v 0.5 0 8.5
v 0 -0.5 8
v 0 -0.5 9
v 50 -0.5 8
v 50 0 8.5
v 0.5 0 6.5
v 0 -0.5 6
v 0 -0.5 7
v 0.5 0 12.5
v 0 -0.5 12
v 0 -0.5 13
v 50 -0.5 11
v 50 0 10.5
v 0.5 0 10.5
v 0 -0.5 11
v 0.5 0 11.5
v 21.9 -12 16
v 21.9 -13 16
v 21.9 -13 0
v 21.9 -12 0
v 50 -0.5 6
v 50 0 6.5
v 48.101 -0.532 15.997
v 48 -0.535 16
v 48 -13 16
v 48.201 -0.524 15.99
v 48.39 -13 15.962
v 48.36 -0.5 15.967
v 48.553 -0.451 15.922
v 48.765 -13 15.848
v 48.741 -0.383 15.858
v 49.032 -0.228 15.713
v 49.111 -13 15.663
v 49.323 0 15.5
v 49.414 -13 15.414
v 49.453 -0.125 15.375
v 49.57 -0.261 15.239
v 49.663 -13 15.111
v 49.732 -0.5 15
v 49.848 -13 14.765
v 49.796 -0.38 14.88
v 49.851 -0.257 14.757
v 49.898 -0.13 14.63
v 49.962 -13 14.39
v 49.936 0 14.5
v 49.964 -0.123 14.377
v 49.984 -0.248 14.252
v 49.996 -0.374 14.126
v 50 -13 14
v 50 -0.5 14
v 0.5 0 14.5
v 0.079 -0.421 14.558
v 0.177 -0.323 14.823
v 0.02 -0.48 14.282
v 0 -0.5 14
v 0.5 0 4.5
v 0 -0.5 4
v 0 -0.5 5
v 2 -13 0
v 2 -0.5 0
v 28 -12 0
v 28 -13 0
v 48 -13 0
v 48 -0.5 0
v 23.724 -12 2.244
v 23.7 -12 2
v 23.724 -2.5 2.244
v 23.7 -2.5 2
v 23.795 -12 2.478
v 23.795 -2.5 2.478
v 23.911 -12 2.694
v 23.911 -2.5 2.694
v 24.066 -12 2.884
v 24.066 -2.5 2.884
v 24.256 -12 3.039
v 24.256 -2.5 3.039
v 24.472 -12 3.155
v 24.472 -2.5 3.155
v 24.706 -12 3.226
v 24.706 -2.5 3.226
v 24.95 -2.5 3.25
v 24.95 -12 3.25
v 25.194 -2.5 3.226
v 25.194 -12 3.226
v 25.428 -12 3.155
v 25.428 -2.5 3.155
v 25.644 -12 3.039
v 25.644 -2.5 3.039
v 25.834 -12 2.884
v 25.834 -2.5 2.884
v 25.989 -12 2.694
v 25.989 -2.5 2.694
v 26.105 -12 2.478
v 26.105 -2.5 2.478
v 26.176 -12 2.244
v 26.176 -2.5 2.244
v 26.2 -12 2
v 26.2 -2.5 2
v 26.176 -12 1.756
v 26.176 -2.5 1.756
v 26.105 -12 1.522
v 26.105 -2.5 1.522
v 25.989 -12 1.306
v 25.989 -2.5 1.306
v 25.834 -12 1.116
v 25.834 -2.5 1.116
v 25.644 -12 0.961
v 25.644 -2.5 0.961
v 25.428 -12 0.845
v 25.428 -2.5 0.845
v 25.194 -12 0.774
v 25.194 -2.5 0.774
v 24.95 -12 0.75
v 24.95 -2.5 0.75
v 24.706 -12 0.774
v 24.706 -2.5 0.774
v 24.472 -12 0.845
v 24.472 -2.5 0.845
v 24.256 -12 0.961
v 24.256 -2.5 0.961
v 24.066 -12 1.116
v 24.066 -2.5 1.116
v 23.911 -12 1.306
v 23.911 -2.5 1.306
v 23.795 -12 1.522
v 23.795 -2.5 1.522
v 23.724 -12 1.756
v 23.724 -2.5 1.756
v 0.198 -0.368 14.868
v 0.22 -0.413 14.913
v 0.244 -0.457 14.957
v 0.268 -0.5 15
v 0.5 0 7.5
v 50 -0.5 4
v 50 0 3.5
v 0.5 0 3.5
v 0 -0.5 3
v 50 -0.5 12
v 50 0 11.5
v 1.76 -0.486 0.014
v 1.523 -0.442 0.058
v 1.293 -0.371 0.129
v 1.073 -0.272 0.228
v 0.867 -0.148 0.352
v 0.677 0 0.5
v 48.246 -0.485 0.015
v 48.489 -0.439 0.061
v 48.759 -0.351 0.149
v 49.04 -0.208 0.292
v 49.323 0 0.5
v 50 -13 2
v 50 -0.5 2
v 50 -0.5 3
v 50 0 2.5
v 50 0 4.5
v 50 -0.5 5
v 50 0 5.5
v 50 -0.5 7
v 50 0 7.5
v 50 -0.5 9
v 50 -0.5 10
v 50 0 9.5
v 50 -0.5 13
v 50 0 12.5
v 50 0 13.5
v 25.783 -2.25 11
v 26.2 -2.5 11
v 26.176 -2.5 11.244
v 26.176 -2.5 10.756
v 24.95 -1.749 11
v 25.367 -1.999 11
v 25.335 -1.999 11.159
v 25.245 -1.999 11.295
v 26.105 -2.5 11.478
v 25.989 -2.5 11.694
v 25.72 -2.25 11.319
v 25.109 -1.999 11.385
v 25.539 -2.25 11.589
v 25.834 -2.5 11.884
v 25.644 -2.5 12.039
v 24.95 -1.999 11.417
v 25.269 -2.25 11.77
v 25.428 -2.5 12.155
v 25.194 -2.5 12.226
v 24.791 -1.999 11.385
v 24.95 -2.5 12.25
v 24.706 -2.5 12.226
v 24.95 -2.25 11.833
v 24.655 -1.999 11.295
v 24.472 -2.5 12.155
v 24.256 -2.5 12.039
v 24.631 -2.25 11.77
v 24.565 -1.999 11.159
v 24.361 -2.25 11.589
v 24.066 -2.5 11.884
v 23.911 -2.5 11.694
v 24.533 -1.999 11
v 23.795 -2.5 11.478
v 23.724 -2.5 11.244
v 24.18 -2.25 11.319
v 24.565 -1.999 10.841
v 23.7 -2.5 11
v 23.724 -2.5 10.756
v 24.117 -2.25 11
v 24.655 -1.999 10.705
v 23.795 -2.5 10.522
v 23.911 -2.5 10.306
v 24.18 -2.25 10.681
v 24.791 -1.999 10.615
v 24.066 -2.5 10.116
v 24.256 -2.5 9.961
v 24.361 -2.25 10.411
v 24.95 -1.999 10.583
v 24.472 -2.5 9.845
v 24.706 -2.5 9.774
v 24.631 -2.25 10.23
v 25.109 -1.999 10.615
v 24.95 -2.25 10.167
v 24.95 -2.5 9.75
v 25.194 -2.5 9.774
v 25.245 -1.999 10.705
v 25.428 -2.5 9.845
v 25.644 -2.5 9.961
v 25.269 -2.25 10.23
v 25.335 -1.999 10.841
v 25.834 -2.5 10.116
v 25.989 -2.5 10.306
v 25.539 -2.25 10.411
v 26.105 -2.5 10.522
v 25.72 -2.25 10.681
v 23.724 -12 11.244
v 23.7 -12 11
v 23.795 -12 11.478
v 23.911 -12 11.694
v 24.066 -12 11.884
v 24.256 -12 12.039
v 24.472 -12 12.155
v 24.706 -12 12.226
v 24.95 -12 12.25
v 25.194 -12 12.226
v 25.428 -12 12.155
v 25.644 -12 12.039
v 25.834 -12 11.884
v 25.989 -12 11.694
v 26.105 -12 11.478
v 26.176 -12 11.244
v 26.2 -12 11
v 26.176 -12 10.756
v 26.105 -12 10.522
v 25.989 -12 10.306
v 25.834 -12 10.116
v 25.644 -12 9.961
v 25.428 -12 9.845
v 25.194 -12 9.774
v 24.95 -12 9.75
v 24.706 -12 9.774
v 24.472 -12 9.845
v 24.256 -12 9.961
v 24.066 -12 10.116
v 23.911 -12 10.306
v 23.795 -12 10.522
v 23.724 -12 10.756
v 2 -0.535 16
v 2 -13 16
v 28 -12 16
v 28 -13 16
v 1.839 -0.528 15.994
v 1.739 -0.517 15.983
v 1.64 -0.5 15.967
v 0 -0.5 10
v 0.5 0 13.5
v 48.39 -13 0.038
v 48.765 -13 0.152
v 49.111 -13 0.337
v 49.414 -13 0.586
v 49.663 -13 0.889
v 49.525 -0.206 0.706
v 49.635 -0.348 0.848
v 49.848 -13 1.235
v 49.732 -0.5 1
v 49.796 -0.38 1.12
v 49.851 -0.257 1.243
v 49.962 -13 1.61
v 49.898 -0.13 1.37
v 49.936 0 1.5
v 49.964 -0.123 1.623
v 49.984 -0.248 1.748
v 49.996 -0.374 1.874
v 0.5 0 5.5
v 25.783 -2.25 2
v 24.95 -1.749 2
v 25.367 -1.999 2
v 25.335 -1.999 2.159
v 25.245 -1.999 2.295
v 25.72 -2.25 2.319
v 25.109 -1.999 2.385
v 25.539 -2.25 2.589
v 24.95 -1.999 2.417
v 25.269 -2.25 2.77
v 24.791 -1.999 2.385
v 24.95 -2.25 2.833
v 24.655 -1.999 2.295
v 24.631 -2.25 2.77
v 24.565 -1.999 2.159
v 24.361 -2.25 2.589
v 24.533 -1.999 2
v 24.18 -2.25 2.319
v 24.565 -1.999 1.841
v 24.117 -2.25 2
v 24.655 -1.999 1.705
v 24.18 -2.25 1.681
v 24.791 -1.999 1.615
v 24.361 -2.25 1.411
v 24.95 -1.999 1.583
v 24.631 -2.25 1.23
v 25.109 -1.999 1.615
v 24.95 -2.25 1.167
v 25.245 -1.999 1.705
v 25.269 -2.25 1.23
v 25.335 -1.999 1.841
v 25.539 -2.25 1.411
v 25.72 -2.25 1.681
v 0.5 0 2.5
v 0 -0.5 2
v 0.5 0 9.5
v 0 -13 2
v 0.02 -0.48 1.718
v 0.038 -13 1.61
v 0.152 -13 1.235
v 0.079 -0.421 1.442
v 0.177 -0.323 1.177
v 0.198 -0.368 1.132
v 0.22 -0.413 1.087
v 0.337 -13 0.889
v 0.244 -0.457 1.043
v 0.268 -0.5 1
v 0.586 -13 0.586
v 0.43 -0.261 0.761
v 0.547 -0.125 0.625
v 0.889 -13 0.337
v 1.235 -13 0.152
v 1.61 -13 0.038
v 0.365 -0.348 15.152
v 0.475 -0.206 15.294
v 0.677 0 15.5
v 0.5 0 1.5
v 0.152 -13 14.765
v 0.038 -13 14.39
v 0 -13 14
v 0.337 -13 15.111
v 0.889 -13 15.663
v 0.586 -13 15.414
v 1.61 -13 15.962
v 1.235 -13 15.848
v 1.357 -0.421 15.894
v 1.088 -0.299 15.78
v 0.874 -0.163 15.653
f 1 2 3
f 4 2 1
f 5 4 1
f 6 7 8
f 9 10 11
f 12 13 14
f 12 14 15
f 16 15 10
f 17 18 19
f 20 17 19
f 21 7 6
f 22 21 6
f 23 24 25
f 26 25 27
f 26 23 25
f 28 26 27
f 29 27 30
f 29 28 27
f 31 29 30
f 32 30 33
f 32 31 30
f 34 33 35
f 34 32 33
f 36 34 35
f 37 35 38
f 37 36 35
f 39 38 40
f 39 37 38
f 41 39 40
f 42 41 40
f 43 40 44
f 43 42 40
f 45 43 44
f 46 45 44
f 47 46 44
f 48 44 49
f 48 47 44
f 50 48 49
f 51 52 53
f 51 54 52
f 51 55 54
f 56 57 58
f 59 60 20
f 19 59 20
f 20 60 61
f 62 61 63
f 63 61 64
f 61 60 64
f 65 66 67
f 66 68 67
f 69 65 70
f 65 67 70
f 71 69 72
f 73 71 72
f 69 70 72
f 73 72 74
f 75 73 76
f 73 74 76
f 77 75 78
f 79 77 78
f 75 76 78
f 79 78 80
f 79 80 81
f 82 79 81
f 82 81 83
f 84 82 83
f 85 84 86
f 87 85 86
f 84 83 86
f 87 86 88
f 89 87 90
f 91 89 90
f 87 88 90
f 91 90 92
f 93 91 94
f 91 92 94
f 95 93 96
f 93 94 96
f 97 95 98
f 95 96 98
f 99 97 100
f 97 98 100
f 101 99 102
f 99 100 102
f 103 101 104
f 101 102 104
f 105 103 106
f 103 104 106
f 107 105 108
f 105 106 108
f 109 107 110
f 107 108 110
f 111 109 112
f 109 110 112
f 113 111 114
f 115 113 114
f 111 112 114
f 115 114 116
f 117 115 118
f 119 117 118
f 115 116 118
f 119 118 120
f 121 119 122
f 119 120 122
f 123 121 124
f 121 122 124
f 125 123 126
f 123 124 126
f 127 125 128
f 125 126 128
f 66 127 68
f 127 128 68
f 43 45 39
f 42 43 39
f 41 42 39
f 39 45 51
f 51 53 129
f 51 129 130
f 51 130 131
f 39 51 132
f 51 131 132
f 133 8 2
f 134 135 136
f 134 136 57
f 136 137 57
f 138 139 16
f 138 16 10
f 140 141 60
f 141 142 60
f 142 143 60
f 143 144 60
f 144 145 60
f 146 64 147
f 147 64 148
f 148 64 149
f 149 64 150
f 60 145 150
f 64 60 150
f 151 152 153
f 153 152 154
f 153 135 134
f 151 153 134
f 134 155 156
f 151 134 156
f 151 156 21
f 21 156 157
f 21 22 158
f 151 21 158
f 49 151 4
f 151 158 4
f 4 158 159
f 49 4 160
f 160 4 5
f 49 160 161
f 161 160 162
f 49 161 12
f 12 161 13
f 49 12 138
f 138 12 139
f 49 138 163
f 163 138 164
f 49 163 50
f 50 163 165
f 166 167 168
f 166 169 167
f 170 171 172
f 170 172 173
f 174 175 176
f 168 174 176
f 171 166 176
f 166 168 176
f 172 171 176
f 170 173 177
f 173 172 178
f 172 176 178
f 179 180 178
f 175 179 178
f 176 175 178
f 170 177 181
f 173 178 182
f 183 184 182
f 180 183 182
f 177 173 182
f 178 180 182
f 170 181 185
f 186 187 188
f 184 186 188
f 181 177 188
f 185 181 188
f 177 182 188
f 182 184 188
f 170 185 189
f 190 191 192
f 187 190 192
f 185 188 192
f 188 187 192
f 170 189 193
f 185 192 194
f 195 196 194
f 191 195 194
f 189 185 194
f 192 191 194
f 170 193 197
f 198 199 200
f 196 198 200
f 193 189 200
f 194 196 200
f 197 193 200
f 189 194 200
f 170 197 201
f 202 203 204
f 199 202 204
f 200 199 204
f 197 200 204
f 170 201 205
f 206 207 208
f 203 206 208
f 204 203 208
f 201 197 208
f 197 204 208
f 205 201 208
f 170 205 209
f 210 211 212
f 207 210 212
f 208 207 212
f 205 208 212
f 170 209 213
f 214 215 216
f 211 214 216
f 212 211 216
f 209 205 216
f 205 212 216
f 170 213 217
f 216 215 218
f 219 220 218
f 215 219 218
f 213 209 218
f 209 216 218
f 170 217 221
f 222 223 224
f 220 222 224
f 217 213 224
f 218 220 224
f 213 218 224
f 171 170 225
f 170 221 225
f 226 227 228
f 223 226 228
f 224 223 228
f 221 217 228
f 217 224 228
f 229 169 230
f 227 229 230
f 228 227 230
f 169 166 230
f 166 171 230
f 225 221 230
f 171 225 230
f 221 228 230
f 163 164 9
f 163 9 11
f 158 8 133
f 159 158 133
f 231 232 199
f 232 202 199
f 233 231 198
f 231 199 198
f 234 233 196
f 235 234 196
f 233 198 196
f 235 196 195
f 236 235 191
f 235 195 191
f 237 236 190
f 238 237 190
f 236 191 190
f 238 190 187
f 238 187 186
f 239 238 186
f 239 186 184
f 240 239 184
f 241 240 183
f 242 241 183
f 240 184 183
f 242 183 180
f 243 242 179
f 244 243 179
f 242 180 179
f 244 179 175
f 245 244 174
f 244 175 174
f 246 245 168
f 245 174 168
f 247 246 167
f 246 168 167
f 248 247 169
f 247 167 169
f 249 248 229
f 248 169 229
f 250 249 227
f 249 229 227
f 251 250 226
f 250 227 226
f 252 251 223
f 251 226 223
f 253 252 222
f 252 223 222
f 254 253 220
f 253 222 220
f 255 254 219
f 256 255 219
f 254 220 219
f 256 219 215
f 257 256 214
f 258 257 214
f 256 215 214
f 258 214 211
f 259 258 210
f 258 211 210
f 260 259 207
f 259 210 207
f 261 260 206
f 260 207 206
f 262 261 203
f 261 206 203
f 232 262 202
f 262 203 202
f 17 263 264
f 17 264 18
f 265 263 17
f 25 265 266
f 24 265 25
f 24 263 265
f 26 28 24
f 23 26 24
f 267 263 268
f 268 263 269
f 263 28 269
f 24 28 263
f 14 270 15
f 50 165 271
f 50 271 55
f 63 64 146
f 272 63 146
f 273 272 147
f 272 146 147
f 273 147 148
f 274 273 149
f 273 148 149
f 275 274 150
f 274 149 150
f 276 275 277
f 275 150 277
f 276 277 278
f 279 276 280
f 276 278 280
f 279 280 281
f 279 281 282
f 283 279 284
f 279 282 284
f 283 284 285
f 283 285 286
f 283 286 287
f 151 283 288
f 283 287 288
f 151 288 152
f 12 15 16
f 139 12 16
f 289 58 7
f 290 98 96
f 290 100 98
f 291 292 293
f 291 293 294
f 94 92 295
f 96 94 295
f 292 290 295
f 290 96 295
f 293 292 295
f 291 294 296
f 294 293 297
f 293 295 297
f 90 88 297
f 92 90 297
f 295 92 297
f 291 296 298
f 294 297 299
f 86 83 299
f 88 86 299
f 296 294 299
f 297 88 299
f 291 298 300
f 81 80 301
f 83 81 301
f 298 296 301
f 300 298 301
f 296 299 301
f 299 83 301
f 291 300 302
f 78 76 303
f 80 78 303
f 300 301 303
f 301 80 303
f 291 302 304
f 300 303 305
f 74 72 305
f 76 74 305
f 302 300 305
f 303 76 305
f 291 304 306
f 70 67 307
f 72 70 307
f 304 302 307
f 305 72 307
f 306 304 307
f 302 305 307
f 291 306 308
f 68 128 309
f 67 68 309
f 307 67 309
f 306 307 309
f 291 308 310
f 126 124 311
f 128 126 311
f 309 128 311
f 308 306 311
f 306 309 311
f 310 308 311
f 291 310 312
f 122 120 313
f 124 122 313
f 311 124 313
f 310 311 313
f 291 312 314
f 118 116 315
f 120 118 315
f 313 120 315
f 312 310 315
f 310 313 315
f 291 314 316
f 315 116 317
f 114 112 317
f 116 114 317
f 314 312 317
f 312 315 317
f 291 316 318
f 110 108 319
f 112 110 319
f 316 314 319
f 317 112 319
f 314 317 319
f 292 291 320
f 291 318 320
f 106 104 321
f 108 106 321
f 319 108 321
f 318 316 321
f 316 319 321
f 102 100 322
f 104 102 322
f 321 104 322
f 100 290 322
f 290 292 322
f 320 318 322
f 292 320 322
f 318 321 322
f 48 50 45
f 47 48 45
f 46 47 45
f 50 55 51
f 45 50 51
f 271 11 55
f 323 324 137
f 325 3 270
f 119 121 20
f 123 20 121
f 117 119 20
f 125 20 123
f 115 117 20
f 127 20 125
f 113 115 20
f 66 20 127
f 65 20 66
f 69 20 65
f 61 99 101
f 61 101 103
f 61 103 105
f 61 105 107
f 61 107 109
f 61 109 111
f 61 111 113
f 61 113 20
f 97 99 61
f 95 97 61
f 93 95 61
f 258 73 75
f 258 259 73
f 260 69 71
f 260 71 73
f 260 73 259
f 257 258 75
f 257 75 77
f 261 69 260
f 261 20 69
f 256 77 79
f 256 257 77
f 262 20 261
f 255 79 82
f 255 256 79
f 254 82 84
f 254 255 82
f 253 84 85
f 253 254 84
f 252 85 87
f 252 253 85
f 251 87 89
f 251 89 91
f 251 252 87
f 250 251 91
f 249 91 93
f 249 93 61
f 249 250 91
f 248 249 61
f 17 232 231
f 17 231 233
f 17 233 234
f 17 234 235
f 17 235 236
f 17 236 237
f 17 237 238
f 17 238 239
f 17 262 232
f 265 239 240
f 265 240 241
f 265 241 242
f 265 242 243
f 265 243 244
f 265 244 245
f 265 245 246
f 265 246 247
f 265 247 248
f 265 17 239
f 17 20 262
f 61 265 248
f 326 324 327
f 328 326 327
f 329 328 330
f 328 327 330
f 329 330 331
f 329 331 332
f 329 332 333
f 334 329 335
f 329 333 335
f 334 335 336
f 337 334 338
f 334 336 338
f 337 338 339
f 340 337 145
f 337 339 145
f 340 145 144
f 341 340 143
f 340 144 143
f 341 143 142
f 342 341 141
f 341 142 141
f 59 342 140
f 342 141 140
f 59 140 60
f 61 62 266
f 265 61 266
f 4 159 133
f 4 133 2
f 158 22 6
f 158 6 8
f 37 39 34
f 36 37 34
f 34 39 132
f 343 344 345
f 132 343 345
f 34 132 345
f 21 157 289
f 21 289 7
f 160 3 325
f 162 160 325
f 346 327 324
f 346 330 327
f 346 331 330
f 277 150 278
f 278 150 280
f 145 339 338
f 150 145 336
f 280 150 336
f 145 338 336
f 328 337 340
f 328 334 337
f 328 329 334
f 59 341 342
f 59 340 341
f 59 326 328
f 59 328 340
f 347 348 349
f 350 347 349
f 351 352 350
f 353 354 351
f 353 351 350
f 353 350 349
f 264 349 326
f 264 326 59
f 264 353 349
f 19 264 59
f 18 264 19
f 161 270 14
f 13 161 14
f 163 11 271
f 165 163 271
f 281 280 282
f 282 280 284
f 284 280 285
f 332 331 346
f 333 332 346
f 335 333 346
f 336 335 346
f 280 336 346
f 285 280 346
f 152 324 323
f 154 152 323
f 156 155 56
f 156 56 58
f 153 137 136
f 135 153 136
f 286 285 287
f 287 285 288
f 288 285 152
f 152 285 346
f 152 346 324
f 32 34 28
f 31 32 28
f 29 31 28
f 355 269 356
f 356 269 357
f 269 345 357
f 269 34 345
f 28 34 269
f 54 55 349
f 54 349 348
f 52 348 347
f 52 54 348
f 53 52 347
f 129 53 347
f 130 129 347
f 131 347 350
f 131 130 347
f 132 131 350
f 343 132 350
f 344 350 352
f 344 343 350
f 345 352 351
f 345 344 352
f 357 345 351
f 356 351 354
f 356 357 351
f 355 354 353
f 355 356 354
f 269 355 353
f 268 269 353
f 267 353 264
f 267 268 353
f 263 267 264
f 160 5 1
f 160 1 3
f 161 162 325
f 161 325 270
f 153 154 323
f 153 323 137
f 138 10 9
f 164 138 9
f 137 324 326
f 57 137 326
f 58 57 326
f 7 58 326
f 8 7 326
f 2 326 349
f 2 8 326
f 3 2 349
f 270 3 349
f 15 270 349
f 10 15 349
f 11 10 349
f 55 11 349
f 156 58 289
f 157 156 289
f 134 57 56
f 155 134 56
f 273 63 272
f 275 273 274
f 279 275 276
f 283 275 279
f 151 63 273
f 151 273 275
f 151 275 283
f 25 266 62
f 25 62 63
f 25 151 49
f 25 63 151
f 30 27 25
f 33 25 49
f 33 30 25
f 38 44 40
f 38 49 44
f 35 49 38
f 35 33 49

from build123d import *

# Parameters (mm, degrees)
F0_W         = 50
F0_H         = 16
F1_DEPTH     = 13
F2_W         = 6.1
F2_H         = 2
F2_H_2       = 16
F3_DEPTH     = 1
F5_D         = 2.5
F5_DEPTH     = 9.5
F5_TIP       = 0.7510757738
F6_SIZE      = 0.5
F8_DEPTH     = 50.001
F9_DEPTH     = 50.001
F10_T1_DEPTH = 22.4650386507
F10_T3_DEPTH = 22.5


# Not quite as in the source:
# - a fillet or chamfer that OpenCascade refuses, or shapes differently, is made with other operations: its cross-section is extruded or revolved along the edge and cut away or added


with BuildPart() as f1:
    # F0 (on Front) → F1 (new body)
    with BuildSketch(Plane.XZ):
        with Locations((25, 8)):
            Rectangle(F0_W, F0_H)
    extrude(amount=F1_DEPTH)

    # F2 (on face) → F3 (cut)
    with BuildSketch(Plane.XZ.offset(13)):
        with Locations((24.95, -1)):
            Rectangle(F2_W, F2_H)
        with Locations((24.95, 8)):
            Rectangle(F2_W, F2_H_2)
    extrude(amount=-F3_DEPTH, mode=Mode.SUBTRACT)

    # F5
    with Locations(Plane.XZ.offset(12)):
        with Locations((24.95, 11), (24.95, 2)):
            Hole(F5_D / 2, depth=F5_DEPTH)
            with Locations((0, 0, -(F5_DEPTH + F5_TIP / 2))):  # 118° drill point
                Cone(0, F5_D / 2, F5_TIP, mode=Mode.SUBTRACT)

    # F6
    f6_edges = [f1.edges().sort_by_distance(p)[0] for p in [
        (0, 0, 8),
        (25, 0, 16),
        (25, 0, 0),
    ]]
    chamfer(f6_edges, length=F6_SIZE)

    # F7 (on face) → F8 (cut, through all)
    with BuildSketch(Plane(origin=(0, 0, 0), x_dir=(0, -1, 0), z_dir=(-1, 0, 0))):
        Polygon((0, 3.5), (0, 2.5), (0.5, 3), align=None)
        Polygon((0, 4.5), (0, 3.5), (0.5, 4), align=None)
        Polygon((0, 5.5), (0, 4.5), (0.5, 5), align=None)
        Polygon((0, 6.5), (0, 5.5), (0.5, 6), align=None)
        Polygon((0, 7.5), (0, 6.5), (0.5, 7), align=None)
        Polygon((0, 8.5), (0, 7.5), (0.5, 8), align=None)
        Polygon((0, 9.5), (0, 8.5), (0.5, 9), align=None)
        Polygon((0, 10.5), (0, 9.5), (0.5, 10), align=None)
        Polygon((0, 11.5), (0, 10.5), (0.5, 11), align=None)
        Polygon((0.5, 12), (0, 12.5), (0, 11.5), align=None)
        Polygon((0.5, 13), (0, 13.5), (0, 12.5), align=None)
        Polygon((0.5, 14), (0, 14.5), (0, 13.5), align=None)
        Polygon((0.5, 15), (0, 15.5), (0, 14.5), align=None)
        Polygon((0.5, 16), (0.5349613493, 16), (0, 16.5), (0, 15.5), (0.5, 15.9673234811), align=None)
        Polygon((0.5, 15.9673234811), (0.5349613493, 16), (0.5, 16), align=None)
        Polygon((0, 1.5), (0, 0.5), (0.5, 1), align=None)
    extrude(amount=-F8_DEPTH, mode=Mode.SUBTRACT)

    # F7 (on face) → F9 (cut, through all)
    with BuildSketch(Plane(origin=(0, 0, 0), x_dir=(0, -1, 0), z_dir=(-1, 0, 0))):
        Polygon((0, 2.5), (0, 1.5), (0.5, 2), align=None)
    extrude(amount=-F9_DEPTH, mode=Mode.SUBTRACT)

    # F10: fillet of radius 2 on 4 edges, made by hand

    # F10_s2 → F10_t1 (cut)
    with BuildSketch(Plane.XZ.offset(-4.4650386507)):
        with BuildLine():
            ThreePointArc((48, 16), (49.4142135624, 15.4142135624), (50, 14))
            Line((50, 14), (50, 16))
            Line((50, 16), (48, 16))
        make_face()
        with BuildLine():
            ThreePointArc((0, 14), (0.5857864376, 15.4142135624), (2, 16))
            Line((2, 16), (0, 16))
            Line((0, 16), (0, 14))
        make_face()
    extrude(amount=F10_T1_DEPTH, mode=Mode.SUBTRACT)

    # F10_s4 → F10_t3 (cut)
    with BuildSketch(Plane.XZ.offset(-4.5)):
        with BuildLine():
            ThreePointArc((48, 0), (49.4142135624, 0.5857864376), (50, 2))
            Line((50, 2), (50, 0))
            Line((50, 0), (48, 0))
        make_face()
        with BuildLine():
            ThreePointArc((0, 2), (0.5857864376, 0.5857864376), (2, 0))
            Line((2, 0), (0, 0))
            Line((0, 0), (0, 2))
        make_face()
    extrude(amount=F10_T3_DEPTH, mode=Mode.SUBTRACT)


solid = f1.part
